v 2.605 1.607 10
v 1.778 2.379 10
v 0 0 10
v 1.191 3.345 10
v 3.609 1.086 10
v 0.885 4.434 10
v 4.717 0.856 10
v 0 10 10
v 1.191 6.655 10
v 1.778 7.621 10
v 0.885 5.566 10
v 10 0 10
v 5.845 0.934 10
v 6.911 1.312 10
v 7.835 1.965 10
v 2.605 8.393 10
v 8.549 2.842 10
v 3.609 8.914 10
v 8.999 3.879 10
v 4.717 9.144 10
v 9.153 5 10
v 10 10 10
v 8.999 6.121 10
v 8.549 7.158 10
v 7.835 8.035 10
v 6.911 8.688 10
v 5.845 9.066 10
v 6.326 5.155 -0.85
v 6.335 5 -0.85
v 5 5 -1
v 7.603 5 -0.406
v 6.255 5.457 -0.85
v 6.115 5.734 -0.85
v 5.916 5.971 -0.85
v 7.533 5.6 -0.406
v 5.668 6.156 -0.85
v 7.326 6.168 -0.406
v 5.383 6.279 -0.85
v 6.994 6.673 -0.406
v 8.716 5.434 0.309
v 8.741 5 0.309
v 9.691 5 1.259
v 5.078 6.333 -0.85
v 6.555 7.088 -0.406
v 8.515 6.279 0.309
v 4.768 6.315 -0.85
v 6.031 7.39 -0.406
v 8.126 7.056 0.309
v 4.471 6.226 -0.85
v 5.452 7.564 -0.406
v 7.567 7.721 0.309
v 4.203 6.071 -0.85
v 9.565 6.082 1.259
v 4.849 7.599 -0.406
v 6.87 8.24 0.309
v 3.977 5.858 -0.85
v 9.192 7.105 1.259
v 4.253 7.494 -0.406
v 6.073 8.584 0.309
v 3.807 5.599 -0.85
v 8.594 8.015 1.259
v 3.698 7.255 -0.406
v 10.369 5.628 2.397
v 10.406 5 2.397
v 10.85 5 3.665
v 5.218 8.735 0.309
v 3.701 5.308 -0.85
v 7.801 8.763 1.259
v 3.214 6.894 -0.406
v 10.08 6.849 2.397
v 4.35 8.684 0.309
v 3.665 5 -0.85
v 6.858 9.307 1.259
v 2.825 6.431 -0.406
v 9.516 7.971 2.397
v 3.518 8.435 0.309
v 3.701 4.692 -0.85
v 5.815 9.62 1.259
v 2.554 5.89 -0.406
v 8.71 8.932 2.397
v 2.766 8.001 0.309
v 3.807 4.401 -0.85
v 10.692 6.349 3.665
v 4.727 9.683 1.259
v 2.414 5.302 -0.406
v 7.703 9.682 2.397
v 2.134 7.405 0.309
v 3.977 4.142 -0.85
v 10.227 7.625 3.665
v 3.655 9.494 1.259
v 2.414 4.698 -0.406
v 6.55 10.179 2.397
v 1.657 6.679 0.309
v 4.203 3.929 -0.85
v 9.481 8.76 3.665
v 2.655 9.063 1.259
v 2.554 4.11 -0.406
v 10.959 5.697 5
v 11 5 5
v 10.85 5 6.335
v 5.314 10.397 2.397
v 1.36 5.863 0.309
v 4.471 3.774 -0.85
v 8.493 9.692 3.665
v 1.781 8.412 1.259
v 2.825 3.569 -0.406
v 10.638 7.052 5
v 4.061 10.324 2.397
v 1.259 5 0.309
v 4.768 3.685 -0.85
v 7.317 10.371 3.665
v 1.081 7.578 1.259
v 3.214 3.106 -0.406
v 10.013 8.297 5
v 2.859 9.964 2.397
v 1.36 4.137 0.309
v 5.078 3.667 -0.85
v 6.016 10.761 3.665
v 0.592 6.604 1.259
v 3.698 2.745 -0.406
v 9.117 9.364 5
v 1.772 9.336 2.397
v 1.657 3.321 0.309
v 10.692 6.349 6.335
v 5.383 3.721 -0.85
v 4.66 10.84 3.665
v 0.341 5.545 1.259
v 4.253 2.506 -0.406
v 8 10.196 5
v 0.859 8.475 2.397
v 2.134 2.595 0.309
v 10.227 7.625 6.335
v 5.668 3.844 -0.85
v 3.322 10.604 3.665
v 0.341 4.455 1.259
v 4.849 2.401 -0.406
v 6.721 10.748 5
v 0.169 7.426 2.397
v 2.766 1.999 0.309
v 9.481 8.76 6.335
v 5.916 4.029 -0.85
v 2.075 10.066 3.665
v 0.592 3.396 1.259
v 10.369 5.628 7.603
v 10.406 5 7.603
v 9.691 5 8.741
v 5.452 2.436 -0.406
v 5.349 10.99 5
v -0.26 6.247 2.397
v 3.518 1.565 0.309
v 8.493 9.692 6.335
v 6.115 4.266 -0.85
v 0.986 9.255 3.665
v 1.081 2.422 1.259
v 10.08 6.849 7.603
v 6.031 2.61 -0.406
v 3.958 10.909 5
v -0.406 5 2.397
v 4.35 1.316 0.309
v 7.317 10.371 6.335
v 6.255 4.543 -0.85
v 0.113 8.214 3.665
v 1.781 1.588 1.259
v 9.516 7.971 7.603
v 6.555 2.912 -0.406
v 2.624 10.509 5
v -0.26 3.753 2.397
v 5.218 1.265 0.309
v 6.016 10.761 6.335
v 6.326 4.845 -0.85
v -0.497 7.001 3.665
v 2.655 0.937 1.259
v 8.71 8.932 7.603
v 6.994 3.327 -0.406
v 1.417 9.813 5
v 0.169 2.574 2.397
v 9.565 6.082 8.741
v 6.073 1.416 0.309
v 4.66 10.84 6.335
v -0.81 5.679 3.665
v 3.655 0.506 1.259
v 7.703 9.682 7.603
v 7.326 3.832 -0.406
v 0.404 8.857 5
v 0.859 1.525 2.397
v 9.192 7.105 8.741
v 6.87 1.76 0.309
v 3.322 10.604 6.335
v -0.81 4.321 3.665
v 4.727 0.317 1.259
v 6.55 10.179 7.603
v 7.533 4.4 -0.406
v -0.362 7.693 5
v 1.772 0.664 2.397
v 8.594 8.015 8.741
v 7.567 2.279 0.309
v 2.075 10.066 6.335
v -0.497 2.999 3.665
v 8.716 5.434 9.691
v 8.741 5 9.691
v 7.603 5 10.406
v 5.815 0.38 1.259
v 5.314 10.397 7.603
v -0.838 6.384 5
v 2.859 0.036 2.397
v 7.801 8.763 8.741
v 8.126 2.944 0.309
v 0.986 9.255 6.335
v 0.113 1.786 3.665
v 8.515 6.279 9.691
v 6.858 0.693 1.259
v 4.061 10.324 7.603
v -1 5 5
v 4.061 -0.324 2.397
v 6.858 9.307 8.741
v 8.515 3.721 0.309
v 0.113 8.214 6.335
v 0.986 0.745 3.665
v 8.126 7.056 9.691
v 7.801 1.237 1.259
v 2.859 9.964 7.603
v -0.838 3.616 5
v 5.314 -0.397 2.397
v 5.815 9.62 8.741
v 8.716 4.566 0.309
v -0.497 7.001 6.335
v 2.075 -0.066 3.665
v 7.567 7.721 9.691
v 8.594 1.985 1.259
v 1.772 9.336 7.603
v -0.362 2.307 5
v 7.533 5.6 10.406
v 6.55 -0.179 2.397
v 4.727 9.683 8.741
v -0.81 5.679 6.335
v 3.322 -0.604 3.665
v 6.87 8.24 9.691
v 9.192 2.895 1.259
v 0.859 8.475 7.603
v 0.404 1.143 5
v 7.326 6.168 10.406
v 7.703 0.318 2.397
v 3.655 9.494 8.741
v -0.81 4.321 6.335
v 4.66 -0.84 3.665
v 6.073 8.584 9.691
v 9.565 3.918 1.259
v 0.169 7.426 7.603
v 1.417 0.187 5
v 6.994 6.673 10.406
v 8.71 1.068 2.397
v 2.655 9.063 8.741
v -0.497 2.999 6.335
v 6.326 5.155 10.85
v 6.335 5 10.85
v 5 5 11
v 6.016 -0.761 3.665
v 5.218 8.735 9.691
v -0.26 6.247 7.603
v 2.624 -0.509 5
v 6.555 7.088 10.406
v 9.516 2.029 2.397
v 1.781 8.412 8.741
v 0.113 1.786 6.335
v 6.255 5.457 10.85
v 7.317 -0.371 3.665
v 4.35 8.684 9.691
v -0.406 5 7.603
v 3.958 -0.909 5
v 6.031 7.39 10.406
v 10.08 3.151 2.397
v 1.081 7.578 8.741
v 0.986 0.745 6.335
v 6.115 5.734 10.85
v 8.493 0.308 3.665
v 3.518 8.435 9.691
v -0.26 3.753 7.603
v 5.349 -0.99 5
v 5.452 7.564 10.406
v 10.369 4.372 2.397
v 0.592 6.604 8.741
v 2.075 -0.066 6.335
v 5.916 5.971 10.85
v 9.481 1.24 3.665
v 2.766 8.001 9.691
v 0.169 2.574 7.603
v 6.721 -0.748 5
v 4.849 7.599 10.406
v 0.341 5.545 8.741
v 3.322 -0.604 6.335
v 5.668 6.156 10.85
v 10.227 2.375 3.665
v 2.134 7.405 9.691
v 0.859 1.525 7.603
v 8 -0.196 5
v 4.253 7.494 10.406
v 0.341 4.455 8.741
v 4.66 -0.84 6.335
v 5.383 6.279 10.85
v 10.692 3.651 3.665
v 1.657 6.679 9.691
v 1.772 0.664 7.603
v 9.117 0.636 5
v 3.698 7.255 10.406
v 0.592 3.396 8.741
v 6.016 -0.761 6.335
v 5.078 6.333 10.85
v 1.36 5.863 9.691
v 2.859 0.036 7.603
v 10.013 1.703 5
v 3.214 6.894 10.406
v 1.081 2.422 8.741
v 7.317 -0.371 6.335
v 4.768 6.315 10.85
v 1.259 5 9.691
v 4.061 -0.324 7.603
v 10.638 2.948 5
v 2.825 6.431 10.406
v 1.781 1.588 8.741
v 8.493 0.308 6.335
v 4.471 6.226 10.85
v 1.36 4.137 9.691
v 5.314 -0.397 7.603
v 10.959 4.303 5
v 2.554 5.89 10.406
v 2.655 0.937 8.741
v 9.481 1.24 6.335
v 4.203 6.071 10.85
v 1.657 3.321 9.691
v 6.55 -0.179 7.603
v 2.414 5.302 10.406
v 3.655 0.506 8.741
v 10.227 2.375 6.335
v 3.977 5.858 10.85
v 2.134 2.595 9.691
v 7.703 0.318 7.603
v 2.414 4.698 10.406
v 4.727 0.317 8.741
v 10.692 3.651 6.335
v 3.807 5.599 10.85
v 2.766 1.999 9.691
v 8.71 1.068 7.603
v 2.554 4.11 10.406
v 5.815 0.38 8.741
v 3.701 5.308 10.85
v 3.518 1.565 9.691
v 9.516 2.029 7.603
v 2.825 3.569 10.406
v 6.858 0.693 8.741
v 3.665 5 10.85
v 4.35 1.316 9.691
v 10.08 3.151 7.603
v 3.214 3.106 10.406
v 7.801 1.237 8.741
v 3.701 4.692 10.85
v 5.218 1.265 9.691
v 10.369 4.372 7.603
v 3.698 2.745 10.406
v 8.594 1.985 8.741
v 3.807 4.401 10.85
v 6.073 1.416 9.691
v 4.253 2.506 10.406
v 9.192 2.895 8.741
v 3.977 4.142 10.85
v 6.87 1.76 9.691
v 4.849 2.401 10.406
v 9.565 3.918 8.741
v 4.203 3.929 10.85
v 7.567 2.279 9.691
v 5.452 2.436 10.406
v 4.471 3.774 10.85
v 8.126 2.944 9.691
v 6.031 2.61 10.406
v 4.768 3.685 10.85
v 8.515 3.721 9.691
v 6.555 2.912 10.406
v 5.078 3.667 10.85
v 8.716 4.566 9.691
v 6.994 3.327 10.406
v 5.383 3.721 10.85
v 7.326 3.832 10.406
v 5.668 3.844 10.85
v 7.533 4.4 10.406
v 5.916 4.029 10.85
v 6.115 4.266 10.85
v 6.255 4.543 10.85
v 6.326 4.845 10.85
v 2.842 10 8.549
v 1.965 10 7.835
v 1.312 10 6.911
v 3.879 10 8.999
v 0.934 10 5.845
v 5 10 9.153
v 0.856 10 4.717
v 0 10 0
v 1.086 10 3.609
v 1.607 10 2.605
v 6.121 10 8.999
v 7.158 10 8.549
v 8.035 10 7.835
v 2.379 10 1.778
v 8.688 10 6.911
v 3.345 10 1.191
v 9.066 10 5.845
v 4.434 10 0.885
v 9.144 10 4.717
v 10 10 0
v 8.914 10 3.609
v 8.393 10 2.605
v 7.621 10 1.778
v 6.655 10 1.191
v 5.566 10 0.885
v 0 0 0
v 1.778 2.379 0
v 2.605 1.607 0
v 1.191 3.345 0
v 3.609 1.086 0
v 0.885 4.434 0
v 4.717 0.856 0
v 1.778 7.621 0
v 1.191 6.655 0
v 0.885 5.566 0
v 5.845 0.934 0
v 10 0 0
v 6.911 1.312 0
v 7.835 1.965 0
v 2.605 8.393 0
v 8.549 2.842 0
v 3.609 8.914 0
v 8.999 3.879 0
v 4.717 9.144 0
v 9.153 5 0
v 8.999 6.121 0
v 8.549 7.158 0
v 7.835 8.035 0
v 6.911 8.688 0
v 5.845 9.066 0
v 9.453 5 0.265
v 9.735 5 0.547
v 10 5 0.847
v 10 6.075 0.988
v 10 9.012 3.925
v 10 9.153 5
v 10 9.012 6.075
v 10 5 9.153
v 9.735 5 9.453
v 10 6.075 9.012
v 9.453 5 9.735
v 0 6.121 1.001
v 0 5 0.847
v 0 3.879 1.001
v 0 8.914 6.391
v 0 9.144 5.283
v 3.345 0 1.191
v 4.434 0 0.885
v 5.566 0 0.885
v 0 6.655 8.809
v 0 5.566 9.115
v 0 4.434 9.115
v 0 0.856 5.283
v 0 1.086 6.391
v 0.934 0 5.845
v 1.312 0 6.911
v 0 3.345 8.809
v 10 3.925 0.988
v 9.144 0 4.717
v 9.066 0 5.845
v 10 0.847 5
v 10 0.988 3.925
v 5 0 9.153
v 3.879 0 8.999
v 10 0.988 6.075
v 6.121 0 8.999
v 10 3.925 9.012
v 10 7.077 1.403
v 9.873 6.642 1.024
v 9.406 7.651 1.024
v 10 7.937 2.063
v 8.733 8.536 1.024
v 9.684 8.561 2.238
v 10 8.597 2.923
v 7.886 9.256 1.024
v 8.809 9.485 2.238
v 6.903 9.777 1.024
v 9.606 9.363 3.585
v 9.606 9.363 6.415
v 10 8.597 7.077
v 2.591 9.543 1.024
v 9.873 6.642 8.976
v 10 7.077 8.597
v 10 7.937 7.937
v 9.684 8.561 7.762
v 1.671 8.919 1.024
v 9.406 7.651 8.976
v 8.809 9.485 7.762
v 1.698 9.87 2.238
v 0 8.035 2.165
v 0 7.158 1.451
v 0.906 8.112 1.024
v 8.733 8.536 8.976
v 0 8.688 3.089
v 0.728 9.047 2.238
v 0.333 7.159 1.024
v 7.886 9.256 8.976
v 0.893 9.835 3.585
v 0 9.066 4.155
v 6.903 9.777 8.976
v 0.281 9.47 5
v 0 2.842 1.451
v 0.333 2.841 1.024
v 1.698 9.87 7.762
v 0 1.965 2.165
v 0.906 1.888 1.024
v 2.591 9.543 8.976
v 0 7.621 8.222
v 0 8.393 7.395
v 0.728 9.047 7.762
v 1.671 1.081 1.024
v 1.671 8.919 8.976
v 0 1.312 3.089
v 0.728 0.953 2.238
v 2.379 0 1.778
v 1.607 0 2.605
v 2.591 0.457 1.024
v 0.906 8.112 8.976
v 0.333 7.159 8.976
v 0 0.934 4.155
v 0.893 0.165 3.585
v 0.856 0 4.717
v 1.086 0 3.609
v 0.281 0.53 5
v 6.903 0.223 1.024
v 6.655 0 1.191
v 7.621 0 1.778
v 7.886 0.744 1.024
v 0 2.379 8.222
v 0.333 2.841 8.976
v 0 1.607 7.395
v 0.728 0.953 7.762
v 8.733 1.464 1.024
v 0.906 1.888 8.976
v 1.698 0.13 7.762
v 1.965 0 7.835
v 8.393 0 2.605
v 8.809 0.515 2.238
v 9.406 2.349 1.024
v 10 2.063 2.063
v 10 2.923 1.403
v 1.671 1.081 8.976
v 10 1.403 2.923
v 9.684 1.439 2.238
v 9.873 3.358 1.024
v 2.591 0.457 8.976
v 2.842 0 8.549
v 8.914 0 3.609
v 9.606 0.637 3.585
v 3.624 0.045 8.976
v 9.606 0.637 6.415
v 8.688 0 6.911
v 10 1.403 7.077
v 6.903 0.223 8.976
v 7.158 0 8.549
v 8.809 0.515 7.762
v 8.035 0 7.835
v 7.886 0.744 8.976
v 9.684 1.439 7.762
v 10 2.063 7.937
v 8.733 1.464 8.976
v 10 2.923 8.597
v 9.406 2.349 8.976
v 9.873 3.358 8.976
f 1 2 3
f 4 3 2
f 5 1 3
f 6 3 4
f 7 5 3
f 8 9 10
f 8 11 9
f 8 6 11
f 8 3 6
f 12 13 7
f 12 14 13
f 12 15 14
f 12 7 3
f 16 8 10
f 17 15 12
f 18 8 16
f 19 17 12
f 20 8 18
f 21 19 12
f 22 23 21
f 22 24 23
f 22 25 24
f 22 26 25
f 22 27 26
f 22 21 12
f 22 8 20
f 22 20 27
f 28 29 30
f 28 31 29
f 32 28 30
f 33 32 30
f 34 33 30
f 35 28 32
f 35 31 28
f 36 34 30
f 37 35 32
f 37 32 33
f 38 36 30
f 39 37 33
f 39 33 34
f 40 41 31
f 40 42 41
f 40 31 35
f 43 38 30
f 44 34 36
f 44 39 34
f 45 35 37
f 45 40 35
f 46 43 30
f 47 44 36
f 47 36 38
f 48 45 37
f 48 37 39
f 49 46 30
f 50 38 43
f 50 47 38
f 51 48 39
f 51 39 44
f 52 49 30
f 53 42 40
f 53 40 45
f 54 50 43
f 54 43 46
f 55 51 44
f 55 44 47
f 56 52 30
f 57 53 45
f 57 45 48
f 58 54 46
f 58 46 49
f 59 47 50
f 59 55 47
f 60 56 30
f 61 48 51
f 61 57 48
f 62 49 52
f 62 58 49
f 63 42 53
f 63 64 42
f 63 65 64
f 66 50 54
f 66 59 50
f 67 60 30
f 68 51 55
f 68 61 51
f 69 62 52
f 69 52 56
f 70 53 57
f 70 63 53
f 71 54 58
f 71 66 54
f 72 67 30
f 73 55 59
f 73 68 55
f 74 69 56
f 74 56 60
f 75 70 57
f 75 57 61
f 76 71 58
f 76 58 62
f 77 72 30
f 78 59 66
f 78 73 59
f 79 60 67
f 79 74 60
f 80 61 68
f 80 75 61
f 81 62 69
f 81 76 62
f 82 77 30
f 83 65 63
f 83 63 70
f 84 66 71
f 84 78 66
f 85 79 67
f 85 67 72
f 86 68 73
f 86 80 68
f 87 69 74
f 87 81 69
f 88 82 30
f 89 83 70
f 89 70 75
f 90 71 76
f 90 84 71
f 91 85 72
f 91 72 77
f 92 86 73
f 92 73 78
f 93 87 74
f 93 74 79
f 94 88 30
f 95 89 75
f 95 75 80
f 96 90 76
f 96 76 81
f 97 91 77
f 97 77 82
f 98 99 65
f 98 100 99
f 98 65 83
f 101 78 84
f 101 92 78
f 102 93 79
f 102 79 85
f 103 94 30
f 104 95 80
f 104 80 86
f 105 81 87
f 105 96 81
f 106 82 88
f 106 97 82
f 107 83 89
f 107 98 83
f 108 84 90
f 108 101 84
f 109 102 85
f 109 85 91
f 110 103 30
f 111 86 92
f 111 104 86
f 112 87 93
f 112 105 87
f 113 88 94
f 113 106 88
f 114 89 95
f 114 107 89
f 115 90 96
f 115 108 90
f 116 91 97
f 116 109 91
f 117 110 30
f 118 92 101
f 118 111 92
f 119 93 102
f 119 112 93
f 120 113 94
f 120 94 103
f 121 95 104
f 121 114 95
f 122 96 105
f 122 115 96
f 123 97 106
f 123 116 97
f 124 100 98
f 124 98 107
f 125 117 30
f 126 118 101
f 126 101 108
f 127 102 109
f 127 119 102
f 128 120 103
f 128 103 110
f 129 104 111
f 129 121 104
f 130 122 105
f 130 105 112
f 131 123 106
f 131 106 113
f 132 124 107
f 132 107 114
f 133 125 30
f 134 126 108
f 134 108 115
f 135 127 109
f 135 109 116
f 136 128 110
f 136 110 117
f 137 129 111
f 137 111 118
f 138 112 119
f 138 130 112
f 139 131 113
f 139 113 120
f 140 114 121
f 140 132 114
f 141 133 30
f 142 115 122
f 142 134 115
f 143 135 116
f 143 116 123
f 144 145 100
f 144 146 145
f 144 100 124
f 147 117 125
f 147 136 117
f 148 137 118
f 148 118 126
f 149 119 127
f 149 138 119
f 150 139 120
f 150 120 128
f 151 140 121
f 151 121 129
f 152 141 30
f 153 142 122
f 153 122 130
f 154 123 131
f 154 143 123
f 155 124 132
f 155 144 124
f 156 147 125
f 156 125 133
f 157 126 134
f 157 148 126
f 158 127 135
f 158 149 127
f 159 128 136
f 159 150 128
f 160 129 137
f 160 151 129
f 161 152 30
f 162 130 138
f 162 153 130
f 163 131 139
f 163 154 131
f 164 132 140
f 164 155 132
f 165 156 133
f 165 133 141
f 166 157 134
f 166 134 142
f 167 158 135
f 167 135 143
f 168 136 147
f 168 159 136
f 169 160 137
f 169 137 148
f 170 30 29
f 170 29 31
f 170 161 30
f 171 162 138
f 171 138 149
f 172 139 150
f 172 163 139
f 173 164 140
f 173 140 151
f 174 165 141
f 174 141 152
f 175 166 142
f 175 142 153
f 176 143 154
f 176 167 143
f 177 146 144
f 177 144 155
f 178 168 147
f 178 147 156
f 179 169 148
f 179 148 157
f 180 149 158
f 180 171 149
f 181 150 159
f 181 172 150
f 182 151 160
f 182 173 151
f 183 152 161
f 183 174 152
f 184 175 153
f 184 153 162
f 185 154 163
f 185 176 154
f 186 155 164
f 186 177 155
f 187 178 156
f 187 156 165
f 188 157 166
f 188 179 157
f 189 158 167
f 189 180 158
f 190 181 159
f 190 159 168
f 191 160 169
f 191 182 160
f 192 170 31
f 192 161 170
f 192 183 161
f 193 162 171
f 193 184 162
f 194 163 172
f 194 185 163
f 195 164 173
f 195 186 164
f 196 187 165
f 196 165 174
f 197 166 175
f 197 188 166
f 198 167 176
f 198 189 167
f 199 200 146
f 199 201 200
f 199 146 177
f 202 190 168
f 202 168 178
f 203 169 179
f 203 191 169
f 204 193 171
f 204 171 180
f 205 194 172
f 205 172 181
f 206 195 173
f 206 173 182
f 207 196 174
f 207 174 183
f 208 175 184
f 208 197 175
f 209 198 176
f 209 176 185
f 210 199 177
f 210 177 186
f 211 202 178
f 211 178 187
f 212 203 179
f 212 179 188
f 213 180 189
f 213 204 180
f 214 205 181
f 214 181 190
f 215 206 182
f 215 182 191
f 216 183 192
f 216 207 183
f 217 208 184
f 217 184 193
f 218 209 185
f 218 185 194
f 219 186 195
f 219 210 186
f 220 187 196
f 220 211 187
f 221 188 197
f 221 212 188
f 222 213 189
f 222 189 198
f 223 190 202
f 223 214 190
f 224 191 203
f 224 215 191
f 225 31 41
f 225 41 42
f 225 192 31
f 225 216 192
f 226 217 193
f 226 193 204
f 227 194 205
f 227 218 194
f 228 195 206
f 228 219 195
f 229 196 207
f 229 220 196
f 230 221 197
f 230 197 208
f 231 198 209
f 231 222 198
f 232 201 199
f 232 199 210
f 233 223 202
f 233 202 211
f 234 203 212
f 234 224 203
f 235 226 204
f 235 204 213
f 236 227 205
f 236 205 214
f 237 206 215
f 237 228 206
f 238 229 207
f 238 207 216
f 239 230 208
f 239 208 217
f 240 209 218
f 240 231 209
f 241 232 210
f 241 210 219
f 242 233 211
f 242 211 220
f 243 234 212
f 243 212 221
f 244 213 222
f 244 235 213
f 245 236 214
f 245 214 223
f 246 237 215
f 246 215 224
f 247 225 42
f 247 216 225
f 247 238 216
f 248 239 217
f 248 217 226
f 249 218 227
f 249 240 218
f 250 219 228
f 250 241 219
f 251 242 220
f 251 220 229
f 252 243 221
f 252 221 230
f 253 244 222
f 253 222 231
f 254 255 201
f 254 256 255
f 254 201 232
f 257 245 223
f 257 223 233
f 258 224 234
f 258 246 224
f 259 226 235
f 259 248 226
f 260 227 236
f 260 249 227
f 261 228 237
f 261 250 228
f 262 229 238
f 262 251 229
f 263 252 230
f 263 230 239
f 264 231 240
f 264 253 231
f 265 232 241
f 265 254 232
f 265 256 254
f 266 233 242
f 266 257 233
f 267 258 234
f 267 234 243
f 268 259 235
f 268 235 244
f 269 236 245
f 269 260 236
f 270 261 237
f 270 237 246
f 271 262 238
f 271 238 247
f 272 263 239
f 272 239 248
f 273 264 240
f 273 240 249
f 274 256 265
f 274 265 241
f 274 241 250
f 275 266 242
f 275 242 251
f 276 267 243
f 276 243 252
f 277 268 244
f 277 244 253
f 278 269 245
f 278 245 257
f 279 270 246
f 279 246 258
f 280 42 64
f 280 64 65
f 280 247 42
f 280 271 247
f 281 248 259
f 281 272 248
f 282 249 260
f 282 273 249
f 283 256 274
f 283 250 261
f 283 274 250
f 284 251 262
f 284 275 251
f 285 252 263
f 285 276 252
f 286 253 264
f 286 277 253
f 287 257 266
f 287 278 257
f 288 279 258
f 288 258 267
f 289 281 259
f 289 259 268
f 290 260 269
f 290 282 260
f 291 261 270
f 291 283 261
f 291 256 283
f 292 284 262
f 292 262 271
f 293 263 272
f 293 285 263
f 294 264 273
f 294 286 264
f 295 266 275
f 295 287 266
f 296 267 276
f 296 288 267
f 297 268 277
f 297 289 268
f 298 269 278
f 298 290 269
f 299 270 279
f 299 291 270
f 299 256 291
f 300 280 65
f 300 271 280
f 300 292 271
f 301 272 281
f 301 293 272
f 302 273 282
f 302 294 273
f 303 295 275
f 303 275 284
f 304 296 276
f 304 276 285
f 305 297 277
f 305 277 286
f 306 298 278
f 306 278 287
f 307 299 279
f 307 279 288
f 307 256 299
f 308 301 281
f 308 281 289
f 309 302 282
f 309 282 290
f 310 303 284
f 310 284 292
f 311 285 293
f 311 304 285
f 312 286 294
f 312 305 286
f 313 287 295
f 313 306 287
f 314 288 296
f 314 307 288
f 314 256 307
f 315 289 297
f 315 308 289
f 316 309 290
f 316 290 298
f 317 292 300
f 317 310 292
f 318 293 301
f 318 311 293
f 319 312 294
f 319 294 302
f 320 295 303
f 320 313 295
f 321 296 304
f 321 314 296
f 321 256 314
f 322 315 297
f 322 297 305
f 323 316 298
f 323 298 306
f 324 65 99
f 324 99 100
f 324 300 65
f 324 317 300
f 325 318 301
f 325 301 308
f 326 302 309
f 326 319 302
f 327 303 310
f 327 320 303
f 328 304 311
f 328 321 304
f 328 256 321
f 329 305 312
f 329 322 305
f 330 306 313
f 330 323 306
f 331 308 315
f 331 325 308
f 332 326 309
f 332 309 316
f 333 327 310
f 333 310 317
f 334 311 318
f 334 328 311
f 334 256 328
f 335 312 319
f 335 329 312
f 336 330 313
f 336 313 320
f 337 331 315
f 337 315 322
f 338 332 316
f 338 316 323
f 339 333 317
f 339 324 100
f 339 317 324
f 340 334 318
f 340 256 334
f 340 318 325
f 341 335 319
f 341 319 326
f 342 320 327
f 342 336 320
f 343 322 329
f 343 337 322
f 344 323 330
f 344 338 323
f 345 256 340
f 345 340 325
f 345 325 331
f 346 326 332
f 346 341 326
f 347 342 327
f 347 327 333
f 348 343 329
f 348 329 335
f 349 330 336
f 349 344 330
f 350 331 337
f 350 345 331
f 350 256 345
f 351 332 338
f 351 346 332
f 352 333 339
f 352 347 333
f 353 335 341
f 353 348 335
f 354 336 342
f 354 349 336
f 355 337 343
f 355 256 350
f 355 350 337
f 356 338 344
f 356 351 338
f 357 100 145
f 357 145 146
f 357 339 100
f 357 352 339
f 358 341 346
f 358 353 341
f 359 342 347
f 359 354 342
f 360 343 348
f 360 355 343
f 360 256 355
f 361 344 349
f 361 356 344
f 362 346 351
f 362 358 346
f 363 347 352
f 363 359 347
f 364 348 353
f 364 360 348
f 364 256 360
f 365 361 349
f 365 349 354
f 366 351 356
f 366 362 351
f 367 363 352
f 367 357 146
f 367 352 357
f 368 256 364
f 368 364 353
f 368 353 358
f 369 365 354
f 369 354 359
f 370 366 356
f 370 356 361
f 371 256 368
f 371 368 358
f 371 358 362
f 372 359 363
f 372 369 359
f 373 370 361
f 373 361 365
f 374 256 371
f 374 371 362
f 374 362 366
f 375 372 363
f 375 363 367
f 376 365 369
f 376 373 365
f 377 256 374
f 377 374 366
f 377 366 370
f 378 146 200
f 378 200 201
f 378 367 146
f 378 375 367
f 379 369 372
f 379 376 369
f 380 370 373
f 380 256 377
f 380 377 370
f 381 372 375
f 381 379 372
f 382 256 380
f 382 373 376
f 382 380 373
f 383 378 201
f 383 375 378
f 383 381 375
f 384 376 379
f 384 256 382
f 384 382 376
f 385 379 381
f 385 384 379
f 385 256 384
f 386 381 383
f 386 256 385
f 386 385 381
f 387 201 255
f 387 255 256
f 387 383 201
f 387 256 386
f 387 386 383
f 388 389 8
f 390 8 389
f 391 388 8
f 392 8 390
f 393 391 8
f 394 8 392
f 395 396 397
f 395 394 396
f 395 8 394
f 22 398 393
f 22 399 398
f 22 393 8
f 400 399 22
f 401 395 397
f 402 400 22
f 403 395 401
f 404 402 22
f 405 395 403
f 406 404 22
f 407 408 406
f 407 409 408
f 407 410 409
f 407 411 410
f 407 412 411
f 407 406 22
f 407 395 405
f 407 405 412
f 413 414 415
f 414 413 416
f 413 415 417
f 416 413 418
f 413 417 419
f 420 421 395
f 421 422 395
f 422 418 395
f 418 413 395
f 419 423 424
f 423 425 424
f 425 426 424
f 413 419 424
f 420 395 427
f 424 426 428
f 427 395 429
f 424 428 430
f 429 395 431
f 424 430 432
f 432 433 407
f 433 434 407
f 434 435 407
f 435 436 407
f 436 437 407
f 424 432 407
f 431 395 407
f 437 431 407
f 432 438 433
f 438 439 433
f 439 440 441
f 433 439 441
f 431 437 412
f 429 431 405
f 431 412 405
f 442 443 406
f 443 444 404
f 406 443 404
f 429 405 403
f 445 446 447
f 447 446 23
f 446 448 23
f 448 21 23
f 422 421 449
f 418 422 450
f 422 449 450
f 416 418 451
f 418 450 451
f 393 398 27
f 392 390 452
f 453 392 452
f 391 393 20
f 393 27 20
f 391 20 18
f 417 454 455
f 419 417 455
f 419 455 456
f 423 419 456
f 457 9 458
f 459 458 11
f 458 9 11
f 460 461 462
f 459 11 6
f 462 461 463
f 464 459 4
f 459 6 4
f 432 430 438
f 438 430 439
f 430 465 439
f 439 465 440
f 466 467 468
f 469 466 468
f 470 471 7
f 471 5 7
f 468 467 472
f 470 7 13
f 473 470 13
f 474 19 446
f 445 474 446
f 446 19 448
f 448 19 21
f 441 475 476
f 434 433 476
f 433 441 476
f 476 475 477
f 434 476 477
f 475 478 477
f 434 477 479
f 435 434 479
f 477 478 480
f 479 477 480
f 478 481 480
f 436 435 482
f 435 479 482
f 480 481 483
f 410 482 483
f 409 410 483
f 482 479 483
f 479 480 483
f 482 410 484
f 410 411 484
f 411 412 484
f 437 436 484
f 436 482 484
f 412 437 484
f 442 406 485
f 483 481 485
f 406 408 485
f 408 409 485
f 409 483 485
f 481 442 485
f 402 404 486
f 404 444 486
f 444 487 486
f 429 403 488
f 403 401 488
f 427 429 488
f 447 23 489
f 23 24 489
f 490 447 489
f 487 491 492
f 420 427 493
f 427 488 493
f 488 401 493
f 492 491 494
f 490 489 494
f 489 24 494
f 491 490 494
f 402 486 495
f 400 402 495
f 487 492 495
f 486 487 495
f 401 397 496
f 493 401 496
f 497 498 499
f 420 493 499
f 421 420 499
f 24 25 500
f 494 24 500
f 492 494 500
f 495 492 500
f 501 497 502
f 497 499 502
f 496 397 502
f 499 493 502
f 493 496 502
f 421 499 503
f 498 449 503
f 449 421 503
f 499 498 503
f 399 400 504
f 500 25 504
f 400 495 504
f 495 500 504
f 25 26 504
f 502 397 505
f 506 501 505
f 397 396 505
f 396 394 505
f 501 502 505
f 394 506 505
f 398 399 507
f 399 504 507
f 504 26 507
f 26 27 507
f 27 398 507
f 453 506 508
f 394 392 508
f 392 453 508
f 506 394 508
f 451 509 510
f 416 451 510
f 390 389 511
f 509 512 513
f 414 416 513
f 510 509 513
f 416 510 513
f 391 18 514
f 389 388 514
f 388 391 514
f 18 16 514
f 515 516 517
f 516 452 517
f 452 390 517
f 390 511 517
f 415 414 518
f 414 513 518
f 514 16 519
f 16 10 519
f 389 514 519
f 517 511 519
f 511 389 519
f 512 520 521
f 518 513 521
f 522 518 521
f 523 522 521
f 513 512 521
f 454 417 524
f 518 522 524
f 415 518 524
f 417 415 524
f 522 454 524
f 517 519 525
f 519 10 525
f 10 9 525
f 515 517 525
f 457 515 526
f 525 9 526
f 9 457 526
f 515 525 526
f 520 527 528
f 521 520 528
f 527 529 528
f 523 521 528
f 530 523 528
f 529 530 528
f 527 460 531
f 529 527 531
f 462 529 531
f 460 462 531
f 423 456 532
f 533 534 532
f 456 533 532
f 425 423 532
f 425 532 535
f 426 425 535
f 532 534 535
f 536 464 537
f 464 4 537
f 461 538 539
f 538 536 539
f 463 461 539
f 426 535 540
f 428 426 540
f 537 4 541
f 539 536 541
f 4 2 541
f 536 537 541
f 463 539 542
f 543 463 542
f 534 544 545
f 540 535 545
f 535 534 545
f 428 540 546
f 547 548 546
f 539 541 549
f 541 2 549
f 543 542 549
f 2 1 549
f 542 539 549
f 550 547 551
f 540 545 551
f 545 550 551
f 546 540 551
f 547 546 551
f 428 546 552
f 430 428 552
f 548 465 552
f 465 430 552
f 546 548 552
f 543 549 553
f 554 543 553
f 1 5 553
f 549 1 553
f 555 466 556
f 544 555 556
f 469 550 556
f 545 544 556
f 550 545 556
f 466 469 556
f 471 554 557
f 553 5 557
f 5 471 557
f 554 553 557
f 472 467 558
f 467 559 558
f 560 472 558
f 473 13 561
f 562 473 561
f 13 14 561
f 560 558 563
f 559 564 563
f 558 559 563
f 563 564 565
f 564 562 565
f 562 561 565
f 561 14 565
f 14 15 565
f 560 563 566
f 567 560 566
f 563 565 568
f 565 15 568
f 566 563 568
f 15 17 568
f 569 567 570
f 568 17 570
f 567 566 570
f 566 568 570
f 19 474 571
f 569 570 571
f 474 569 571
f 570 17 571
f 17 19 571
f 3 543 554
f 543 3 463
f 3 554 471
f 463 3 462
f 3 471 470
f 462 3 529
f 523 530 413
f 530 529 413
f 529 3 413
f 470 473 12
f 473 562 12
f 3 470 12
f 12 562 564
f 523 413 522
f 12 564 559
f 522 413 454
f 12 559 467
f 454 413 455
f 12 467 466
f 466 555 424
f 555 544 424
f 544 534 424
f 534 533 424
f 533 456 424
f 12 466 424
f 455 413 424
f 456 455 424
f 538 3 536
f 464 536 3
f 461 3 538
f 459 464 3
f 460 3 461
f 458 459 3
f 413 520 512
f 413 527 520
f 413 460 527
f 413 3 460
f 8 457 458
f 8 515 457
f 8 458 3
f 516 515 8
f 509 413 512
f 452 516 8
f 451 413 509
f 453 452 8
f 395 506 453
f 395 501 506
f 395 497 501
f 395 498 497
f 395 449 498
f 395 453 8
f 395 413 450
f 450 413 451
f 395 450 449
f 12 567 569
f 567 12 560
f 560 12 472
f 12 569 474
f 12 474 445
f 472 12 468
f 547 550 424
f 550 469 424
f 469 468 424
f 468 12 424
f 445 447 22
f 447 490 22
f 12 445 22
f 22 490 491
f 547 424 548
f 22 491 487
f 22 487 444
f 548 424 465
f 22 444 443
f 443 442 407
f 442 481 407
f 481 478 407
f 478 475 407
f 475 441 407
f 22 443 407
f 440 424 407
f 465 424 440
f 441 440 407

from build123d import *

# Parameters (mm, degrees)
CYLINDER002_R     = 4
CYLINDER002_DEPTH = 12
CYLINDER001_R     = 4
CYLINDER001_DEPTH = 12
CYLINDER_R        = 4
CYLINDER_DEPTH    = 12
BOX_W             = 10
BOX_H             = 10
BOX_DEPTH         = 10


with BuildPart() as sphere001:
    # Sphere001 → Sphere001 (revolve)
    with BuildSketch(Plane(origin=(5, 5, 5), x_dir=(1, 0, 0), z_dir=(0, -1, 0))):
        with BuildLine():
            ThreePointArc((0, -6), (6, 0), (0, 6))
            Line((0, 6), (0, -6))
        make_face()
    revolve(axis=Axis((5, 5, 5), (0, 0, 1)))


with BuildPart() as sphere:
    # Sphere → Sphere (revolve)
    with BuildSketch(Plane(origin=(5, 5, 5), x_dir=(1, 0, 0), z_dir=(0, -1, 0))):
        with BuildLine():
            ThreePointArc((0, -6.5), (6.5, 0), (0, 6.5))
            Line((0, 6.5), (0, -6.5))
        make_face()
    revolve(axis=Axis((5, 5, 5), (0, 0, 1)))


with BuildPart() as cylinder002:
    # Cylinder002 → Cylinder002 (new body)
    with BuildSketch(Plane(origin=(5, 11, 5), x_dir=(1, 0, 0), z_dir=(0, -1, 0))):
        Circle(CYLINDER002_R)
    extrude(amount=CYLINDER002_DEPTH)


with BuildPart() as cylinder001:
    # Cylinder001 → Cylinder001 (new body)
    with BuildSketch(Plane(origin=(-1, 5, 5), x_dir=(0, 0, -1), z_dir=(1, 0, 0))):
        Circle(CYLINDER001_R)
    extrude(amount=CYLINDER001_DEPTH)


with BuildPart() as cylinder:
    # Cylinder → Cylinder (new body)
    with BuildSketch(Plane(origin=(5, 5, -1), x_dir=(1, 0, 0), z_dir=(0, 0, 1))):
        Circle(CYLINDER_R)
    extrude(amount=CYLINDER_DEPTH)


with BuildPart() as fusion001:
    # Fusion base: copy of Cylinder001
    add(cylinder001.part)

    # Fusion: union Cylinder
    add(cylinder.part)

    # Fusion001: union Cylinder002, Cylinder001, Cylinder
    add(cylinder002.part)
    add(cylinder001.part)
    add(cylinder.part)


with BuildPart() as cut001:
    # Box → Box (new body)
    with BuildSketch(Plane.XY):
        with Locations((5, 5)):
            Rectangle(BOX_W, BOX_H)
    extrude(amount=BOX_DEPTH)

    # Cut: cut Fusion001
    add(fusion001.part, mode=Mode.SUBTRACT)

    # Cut001: cut Sphere
    add(sphere.part, mode=Mode.SUBTRACT)


solid = Compound([sphere001.part, cut001.part])
